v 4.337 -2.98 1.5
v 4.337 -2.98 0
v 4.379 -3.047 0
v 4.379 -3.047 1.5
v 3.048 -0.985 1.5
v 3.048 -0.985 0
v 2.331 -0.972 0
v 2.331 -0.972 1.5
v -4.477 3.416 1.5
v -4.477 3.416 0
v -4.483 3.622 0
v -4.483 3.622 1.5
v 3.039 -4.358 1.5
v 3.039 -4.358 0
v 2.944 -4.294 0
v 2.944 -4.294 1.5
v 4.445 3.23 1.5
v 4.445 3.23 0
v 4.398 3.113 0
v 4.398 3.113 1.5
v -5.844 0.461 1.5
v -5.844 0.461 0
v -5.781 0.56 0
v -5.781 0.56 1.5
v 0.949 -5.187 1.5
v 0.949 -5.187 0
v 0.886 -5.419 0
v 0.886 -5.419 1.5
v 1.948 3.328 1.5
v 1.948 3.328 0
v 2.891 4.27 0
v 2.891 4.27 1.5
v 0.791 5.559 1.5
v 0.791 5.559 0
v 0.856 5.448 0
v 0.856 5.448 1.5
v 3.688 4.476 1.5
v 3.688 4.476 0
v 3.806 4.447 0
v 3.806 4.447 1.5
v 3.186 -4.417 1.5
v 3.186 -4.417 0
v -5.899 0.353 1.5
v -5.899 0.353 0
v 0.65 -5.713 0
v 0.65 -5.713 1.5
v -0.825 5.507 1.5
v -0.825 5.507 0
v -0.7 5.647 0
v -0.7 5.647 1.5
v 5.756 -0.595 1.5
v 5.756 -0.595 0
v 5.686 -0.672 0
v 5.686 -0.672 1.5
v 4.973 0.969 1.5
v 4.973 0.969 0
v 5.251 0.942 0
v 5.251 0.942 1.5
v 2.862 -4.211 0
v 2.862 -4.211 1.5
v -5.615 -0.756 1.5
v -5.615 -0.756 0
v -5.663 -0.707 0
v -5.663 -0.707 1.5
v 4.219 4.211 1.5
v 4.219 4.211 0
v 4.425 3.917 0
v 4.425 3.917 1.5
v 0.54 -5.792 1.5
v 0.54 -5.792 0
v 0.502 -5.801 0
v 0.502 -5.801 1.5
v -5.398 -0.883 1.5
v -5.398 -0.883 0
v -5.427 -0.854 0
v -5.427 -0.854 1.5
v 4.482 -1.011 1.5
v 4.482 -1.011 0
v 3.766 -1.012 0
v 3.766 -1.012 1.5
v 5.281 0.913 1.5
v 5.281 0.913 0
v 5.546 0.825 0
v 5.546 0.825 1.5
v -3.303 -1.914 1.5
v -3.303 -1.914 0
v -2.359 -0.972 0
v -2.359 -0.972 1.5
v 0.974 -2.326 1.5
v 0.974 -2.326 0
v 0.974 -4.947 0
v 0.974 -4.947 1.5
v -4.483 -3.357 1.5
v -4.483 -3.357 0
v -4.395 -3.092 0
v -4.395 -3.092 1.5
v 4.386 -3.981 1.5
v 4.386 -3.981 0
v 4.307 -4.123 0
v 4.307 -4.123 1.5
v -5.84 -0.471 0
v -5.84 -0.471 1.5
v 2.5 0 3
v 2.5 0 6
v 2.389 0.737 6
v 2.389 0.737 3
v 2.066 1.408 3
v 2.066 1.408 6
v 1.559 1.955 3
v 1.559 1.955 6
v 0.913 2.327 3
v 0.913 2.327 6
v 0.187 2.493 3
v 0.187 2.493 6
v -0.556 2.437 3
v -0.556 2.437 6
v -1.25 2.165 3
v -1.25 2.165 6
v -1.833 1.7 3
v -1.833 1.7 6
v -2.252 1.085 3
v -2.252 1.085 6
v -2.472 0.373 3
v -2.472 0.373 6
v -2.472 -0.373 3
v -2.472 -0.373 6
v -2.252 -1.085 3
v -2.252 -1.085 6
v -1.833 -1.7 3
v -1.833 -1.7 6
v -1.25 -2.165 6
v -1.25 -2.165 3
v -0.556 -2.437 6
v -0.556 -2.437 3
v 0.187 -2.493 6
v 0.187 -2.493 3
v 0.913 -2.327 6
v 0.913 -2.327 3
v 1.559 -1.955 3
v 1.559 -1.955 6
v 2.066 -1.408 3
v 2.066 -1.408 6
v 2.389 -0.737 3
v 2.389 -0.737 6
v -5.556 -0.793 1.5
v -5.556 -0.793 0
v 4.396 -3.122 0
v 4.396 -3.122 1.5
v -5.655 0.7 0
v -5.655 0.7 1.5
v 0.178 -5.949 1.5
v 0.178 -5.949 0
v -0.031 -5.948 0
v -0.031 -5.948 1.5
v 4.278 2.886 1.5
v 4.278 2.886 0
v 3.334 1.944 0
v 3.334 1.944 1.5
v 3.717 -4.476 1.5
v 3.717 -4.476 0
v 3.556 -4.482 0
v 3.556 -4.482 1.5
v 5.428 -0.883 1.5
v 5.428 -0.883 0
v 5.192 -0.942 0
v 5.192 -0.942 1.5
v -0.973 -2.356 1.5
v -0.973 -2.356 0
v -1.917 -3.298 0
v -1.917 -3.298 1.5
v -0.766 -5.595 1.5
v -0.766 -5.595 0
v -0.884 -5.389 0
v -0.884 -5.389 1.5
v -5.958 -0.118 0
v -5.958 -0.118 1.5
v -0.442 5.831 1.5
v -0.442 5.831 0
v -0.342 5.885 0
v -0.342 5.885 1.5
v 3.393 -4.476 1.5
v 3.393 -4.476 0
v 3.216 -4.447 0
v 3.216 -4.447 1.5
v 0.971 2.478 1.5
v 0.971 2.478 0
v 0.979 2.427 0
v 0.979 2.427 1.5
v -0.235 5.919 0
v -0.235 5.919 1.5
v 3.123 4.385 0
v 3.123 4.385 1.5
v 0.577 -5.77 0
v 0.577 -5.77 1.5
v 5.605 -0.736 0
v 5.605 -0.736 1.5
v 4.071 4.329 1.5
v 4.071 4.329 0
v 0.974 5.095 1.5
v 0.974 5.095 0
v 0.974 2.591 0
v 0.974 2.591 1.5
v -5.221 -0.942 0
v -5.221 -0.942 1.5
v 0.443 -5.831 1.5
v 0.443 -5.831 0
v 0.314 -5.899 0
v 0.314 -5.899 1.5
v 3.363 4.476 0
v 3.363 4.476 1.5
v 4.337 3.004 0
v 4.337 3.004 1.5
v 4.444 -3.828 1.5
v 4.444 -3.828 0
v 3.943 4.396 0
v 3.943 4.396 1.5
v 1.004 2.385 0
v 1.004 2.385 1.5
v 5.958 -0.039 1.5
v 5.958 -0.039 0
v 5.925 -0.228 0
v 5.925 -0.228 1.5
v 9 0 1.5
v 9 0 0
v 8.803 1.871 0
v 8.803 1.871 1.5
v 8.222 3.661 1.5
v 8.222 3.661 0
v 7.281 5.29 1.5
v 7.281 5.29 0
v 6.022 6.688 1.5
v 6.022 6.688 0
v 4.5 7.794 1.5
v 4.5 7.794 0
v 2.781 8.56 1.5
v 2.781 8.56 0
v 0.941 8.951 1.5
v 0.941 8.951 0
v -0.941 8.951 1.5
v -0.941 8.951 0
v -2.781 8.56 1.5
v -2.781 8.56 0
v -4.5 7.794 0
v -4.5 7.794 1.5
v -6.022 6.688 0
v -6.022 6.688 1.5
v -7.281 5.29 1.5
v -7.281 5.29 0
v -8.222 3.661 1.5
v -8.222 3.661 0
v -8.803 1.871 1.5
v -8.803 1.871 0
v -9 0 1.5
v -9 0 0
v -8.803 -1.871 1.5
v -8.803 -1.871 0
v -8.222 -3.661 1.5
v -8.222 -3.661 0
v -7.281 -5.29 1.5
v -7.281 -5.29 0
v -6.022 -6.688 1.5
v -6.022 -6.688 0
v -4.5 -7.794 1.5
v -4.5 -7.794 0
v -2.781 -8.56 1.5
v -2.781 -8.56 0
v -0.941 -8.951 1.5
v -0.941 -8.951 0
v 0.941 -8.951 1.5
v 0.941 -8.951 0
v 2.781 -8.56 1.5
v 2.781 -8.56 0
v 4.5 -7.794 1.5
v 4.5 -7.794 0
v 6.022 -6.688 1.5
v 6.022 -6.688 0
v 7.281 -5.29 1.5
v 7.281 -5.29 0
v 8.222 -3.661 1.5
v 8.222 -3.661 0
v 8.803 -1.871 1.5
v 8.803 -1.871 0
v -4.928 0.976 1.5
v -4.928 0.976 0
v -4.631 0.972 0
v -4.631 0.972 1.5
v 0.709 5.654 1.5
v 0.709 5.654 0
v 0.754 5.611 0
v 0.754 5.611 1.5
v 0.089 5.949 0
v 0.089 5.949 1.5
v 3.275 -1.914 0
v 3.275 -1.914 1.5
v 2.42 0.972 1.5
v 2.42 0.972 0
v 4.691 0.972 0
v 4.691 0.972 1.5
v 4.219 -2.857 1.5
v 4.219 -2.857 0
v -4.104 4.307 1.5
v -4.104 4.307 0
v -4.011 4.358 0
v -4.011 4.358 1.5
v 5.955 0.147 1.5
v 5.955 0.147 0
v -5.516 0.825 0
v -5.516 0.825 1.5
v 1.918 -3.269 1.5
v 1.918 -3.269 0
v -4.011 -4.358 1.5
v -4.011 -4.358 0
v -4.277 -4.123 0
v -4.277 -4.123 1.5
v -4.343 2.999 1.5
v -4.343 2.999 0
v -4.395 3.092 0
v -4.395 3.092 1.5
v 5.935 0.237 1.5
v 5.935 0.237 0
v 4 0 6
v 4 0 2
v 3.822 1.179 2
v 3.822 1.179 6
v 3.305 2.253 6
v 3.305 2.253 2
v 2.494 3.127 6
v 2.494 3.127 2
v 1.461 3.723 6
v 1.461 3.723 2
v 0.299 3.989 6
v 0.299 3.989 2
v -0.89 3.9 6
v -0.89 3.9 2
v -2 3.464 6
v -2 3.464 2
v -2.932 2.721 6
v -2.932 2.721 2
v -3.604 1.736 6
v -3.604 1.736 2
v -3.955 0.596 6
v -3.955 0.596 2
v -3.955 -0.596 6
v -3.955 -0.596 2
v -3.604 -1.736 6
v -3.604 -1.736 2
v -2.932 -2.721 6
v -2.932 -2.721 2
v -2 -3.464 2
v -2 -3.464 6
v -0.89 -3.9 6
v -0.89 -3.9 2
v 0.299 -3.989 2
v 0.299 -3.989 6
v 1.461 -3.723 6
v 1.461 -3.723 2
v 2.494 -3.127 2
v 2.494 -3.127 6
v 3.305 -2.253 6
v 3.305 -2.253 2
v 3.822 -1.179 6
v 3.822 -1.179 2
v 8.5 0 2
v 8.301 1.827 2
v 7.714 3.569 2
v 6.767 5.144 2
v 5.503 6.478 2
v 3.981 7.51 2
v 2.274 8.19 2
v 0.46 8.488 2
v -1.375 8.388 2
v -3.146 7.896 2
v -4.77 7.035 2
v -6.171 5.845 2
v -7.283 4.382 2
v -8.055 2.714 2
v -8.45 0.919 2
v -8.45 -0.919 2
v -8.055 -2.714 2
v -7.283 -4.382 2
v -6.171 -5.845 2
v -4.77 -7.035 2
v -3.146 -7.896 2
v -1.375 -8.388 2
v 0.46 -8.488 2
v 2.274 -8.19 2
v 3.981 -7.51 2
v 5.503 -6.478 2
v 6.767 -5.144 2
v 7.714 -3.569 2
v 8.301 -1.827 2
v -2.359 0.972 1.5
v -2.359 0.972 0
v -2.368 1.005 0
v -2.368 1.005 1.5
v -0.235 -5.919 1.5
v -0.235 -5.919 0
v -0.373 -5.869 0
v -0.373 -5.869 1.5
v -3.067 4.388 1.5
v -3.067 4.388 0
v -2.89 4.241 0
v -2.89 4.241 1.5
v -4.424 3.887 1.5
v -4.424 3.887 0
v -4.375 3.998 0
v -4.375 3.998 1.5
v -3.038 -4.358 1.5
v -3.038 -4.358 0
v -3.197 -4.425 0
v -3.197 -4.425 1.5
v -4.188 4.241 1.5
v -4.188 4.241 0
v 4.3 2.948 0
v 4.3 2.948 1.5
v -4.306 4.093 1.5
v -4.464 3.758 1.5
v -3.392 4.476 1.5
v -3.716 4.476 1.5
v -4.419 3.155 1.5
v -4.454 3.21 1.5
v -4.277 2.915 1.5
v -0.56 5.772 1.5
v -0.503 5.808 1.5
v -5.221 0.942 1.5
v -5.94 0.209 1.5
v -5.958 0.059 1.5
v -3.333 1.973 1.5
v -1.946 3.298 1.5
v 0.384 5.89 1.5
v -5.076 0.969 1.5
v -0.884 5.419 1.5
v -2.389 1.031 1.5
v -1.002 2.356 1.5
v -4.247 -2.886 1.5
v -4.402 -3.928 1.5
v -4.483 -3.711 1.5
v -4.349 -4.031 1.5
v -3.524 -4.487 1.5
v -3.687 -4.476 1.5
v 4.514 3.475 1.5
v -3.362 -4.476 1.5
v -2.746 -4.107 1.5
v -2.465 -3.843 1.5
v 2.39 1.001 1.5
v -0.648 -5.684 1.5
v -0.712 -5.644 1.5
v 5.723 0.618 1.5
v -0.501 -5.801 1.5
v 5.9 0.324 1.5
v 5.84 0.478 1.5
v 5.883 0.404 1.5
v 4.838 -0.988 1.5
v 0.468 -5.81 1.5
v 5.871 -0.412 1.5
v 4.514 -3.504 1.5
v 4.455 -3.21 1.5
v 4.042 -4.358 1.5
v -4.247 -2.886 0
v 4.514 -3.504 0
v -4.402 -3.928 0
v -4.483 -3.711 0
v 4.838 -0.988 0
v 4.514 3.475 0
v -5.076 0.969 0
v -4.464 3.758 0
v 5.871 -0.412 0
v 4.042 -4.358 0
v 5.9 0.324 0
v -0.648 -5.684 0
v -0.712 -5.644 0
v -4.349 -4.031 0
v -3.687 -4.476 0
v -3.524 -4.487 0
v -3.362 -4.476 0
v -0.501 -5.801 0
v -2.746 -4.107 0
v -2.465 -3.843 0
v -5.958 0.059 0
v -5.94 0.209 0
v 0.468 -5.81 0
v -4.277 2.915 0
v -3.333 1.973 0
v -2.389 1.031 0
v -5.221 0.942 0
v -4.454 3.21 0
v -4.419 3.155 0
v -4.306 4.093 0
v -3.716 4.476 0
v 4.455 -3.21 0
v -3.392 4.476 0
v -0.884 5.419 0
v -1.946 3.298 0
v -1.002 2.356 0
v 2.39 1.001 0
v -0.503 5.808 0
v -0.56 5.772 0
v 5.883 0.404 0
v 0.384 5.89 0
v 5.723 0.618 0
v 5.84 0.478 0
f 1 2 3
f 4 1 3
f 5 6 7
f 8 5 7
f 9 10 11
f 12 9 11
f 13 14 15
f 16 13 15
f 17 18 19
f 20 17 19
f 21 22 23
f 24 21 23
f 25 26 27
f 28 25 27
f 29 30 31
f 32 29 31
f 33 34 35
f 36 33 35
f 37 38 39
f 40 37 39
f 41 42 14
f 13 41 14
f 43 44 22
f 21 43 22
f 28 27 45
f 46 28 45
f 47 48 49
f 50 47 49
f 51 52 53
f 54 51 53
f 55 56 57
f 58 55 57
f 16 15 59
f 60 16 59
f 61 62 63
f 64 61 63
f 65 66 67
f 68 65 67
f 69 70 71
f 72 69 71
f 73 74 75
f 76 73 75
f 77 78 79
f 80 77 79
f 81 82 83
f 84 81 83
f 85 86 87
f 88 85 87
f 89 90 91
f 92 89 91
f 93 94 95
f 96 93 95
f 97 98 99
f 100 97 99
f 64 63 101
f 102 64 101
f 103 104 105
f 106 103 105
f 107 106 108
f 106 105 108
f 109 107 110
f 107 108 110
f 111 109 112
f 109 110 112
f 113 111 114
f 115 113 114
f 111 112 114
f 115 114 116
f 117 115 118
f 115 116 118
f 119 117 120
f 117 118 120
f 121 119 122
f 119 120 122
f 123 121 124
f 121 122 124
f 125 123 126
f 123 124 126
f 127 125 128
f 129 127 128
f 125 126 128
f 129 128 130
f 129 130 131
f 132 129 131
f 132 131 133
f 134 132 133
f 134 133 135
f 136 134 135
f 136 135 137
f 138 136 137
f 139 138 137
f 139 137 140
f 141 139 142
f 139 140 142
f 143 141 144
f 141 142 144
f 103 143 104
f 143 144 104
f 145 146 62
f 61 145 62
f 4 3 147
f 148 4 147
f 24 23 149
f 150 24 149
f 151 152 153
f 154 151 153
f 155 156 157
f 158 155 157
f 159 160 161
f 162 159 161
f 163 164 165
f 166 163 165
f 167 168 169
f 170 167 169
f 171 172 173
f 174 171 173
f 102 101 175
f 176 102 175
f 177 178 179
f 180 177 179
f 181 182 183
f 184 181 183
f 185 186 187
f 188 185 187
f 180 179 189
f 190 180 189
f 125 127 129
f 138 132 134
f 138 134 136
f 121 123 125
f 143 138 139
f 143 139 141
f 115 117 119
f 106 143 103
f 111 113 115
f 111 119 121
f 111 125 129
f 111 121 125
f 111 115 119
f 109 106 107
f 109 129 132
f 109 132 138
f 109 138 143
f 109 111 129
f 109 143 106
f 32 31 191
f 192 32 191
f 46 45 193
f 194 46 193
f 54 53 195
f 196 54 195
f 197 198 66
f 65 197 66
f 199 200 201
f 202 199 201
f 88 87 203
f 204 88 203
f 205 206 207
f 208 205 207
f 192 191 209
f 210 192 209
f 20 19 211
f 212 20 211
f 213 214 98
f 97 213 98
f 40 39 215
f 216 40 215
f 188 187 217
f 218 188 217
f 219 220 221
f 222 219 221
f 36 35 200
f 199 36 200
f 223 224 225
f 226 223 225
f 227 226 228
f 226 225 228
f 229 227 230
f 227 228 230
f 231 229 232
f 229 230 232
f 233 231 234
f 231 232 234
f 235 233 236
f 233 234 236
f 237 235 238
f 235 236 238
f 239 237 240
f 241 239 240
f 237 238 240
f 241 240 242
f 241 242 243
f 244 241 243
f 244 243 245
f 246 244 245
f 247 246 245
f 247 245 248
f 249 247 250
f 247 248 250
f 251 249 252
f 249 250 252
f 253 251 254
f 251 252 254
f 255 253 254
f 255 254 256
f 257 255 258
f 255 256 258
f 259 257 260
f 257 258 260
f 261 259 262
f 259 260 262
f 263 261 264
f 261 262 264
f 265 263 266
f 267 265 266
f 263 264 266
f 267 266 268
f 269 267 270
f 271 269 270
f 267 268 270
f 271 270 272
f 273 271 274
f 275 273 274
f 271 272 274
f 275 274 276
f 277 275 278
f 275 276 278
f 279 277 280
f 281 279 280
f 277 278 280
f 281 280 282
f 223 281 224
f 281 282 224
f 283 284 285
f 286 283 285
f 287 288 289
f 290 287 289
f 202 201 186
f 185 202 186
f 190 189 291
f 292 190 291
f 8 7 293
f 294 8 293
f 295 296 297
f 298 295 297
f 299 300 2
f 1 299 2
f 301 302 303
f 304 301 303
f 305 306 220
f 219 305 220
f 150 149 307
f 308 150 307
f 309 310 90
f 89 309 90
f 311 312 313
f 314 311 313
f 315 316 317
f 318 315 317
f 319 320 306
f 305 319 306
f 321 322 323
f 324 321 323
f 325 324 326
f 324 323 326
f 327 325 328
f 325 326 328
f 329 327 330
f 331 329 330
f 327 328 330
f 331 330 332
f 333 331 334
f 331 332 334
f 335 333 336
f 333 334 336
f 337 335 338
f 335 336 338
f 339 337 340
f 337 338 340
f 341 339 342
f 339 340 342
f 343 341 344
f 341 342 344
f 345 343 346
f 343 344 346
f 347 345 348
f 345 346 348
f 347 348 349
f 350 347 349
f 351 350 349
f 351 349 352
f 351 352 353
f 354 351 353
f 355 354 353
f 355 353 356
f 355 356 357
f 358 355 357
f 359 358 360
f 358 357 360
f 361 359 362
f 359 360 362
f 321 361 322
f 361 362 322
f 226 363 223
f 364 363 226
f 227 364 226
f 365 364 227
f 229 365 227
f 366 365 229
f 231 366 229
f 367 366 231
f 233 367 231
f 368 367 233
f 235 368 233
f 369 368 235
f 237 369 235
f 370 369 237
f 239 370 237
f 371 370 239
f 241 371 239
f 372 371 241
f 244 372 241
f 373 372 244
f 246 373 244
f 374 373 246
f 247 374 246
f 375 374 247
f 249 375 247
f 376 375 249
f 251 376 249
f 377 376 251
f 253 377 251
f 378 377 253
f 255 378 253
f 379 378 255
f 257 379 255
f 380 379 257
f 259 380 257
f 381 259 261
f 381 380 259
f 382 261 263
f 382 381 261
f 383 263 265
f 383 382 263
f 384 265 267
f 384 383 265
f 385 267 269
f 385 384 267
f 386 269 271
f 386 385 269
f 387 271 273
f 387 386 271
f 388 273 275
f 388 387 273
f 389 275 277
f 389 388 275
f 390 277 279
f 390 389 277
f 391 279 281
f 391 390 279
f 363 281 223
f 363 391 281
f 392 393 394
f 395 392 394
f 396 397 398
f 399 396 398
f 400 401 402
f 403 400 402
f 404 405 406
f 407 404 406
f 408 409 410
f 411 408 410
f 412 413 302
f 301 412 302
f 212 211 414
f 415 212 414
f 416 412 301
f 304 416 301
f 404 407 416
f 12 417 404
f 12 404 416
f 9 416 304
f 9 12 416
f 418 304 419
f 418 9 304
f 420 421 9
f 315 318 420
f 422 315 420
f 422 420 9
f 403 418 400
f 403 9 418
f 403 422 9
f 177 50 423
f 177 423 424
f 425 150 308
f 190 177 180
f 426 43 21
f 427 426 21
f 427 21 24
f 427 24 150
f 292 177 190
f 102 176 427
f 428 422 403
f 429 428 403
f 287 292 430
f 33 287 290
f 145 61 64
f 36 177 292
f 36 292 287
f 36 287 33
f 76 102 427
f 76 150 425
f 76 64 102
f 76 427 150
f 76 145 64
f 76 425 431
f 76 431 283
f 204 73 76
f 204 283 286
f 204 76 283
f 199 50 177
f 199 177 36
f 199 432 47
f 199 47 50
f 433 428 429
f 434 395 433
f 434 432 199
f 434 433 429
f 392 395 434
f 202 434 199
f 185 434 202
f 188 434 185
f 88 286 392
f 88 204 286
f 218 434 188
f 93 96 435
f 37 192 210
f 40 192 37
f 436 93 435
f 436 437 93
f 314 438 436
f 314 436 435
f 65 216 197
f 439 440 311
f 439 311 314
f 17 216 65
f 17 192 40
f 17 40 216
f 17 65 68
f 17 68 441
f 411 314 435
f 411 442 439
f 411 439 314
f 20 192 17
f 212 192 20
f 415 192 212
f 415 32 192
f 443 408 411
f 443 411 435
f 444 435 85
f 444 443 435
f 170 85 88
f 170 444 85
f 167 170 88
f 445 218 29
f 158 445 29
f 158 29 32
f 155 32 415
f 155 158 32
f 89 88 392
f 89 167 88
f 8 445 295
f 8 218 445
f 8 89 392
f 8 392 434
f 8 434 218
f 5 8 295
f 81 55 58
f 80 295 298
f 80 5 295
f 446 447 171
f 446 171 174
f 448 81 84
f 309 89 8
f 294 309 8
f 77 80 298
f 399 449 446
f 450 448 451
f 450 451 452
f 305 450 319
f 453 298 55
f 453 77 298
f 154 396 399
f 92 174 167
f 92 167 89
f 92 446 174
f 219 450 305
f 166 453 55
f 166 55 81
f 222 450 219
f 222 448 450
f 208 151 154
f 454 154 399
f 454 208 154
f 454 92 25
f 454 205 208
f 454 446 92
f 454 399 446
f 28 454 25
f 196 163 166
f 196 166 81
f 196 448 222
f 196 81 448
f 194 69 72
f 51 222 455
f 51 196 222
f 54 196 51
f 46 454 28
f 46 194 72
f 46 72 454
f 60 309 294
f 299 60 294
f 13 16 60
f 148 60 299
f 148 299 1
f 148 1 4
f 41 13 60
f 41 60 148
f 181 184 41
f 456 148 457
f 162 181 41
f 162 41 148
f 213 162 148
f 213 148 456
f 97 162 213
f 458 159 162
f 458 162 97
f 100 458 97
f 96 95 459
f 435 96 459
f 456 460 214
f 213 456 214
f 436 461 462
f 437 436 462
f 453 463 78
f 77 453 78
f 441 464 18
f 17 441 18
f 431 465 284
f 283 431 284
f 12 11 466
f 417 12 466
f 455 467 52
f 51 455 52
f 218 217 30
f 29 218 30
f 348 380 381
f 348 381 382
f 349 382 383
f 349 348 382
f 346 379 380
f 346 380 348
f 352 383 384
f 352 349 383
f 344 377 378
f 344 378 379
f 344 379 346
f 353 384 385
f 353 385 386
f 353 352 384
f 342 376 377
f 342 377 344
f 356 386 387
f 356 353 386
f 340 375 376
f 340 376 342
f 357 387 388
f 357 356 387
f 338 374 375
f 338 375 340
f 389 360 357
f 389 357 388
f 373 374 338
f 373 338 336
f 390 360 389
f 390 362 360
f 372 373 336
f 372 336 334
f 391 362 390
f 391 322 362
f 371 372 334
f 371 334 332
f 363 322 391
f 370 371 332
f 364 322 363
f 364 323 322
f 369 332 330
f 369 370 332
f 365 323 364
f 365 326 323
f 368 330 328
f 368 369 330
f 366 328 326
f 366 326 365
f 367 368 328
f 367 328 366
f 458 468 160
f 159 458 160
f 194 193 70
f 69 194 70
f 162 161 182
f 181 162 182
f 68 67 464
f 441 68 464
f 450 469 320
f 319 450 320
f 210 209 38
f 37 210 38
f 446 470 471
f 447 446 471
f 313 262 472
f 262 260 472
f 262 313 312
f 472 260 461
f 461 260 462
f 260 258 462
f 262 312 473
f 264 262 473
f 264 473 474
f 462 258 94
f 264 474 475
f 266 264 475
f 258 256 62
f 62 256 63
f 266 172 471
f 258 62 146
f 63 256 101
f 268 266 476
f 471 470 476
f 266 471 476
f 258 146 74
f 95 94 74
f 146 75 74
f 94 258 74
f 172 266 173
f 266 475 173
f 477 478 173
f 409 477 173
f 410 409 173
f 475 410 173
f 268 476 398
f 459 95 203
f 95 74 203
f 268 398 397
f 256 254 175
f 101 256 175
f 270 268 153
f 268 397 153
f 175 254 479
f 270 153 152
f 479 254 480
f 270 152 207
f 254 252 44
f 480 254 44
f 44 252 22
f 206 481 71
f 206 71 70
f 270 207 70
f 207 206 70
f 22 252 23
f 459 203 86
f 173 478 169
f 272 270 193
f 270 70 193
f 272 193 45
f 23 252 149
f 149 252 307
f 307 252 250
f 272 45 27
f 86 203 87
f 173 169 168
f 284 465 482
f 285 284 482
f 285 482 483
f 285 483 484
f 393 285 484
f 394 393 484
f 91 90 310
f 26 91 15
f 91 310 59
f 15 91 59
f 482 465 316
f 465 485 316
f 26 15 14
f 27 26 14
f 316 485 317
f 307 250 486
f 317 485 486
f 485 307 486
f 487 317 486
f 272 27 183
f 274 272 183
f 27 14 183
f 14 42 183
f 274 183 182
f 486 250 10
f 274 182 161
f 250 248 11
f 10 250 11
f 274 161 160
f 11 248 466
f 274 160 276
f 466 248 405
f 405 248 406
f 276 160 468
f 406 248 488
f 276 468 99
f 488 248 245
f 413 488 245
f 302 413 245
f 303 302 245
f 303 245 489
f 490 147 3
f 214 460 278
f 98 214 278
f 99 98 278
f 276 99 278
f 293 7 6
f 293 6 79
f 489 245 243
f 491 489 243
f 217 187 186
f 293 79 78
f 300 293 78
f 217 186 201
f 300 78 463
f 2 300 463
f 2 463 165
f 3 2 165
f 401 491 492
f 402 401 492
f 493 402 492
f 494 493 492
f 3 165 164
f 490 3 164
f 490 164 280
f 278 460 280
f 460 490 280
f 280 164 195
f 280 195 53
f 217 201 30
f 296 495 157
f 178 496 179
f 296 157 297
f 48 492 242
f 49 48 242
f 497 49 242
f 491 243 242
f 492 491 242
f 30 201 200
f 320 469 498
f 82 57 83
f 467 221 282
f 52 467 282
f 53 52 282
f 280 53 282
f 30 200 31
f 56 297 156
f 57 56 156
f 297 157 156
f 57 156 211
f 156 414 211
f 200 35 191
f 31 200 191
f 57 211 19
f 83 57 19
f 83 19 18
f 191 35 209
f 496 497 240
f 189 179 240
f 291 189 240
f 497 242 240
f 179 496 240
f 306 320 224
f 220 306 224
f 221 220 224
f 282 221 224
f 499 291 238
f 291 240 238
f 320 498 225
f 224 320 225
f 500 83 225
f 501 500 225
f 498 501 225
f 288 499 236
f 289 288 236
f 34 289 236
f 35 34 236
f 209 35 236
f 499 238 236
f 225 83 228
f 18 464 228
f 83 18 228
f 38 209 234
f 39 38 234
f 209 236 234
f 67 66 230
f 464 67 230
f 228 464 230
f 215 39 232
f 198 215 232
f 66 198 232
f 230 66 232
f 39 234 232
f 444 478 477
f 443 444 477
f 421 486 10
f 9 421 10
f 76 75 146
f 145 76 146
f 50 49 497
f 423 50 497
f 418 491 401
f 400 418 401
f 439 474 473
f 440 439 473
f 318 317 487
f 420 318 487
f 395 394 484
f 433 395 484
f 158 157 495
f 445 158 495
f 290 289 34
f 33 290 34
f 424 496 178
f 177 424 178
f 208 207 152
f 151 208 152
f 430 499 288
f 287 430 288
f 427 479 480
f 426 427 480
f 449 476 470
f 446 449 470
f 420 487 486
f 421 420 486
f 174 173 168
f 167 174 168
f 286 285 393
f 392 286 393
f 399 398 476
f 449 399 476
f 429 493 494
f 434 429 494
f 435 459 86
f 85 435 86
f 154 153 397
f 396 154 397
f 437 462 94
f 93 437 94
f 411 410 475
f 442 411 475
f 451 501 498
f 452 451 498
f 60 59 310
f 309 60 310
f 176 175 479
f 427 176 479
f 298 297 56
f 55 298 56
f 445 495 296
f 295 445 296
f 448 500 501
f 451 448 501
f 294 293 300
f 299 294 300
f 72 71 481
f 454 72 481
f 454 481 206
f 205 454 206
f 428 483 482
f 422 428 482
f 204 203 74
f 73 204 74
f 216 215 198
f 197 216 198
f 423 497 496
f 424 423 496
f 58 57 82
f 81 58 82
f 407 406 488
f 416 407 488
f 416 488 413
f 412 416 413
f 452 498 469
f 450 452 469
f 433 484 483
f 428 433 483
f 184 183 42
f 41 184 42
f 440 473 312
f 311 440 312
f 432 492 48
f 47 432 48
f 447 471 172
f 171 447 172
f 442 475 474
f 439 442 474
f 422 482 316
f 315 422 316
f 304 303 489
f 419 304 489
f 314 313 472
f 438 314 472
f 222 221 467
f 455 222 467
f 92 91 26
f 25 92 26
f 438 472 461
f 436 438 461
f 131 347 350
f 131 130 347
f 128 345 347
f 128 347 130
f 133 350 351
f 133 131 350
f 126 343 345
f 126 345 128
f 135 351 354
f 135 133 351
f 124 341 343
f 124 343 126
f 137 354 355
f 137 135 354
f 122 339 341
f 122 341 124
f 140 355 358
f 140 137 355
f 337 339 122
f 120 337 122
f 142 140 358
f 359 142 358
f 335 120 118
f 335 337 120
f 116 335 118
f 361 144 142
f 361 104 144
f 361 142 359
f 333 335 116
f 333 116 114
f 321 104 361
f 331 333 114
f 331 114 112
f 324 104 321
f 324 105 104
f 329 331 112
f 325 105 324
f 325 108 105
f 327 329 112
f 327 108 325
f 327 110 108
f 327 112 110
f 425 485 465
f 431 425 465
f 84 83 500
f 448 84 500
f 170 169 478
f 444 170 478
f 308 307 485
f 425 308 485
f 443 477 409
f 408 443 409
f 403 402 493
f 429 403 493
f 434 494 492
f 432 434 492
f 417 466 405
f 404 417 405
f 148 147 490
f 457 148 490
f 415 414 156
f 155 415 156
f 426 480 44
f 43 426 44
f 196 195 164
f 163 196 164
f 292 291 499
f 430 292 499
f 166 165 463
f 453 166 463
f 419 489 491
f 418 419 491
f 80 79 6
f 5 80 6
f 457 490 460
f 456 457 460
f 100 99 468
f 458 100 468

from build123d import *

# Parameters (mm, degrees)
F0_R     = 9
F1_DEPTH = 2
F2_R     = 4
F3_DEPTH = 4
F4_R     = 2.5
F5_DEPTH = 3
F6_SIZE  = 0.5
F8_DEPTH = 1.5


with BuildPart() as f1:
    # F0 (on Top) → F1 (new body)
    with BuildSketch(Plane.XY):
        Circle(F0_R)
    extrude(amount=F1_DEPTH)

    # F2 (on face) → F3 (join)
    with BuildSketch(Plane.XY.offset(2)):
        Circle(F2_R)
    extrude(amount=F3_DEPTH)

    # F4 (on face) → F5 (cut)
    with BuildSketch(Plane.XY.offset(6)):
        Circle(F4_R)
    extrude(amount=-F5_DEPTH, mode=Mode.SUBTRACT)

    # F6
    f6_edges = [f1.edges().sort_by_distance(p)[0] for p in [
        (-9, 0, 2),
    ]]
    chamfer(f6_edges, length=F6_SIZE)

    # F7 (on face) → F8 (cut)
    with BuildSketch(Plane(origin=(0, 0, 0), x_dir=(1, 0, 0), z_dir=(0, 0, -1))):
        Polygon((-0.031379, 5.948377), (-0.235333, 5.919157), (-0.372759, 5.868757), (-0.500818, 5.801363), (-0.64831, 5.683569), (-0.711513, 5.643549), (-0.766303, 5.595223), (-0.884297, 5.389084), (-0.972792, 2.355883), (-1.91674, 3.298237), (-2.464657, 3.842872), (-2.74588, 4.106761), (-3.037677, 4.358384), (-3.197437, 4.424921), (-3.362159, 4.476179), (-3.5244, 4.487041), (-3.686641, 4.476179), (-4.011123, 4.358384), (-4.276609, 4.122796), (-4.349034, 4.030994), (-4.401972, 3.928468), (-4.483097, 3.710516), (-4.483097, 3.357134), (-4.394602, 3.092097), (-4.24711, 2.885957), (-3.303163, 1.914155), (-2.359215, 0.971802), (-5.220556, 0.942353), (-5.397547, 0.883456), (-5.427045, 0.854008), (-5.556038, 0.793243), (-5.614945, 0.756011), (-5.663032, 0.706765), (-5.840022, 0.471176), (-5.958016, 0.117794), (-5.958016, -0.058897), (-5.940408, -0.209293), (-5.899019, -0.353383), (-5.843566, -0.461413), (-5.781025, -0.559523), (-5.655249, -0.699811), (-5.51554, -0.82456), (-5.220556, -0.942354), (-5.075648, -0.968558), (-4.928112, -0.97628), (-4.630589, -0.971802), (-4.188114, -0.971802), (-2.359215, -0.971802), (-2.368134, -1.005446), (-2.388713, -1.030699), (-3.332661, -1.973053), (-4.276609, -2.915406), (-4.34313, -2.999393), (-4.394602, -3.092097), (-4.419005, -3.155066), (-4.453599, -3.209892), (-4.476923, -3.415726), (-4.483097, -3.622171), (-4.464349, -3.757662), (-4.424101, -3.887208), (-4.374765, -3.997645), (-4.306107, -4.093348), (-4.188114, -4.240591), (-4.103985, -4.307), (-4.011123, -4.358385), (-3.71614, -4.476179), (-3.391658, -4.476179), (-3.067176, -4.387833), (-2.890186, -4.240591), (-1.946238, -3.298237), (-1.00229, -2.355884), (-0.884297, -5.418533), (-0.8253, -5.506878), (-0.699524, -5.647167), (-0.559815, -5.771915), (-0.503448, -5.807594), (-0.441821, -5.830812), (-0.341941, -5.885287), (-0.235333, -5.919158), (0.089149, -5.948606), (0.384133, -5.889709), (0.708615, -5.654121), (0.754319, -5.61094), (0.790702, -5.558969), (0.856107, -5.447981), (0.9741, -5.094599), (0.9741, -4.417282), (0.9741, -2.591472), (0.971489, -2.477691), (0.979459, -2.426523), (1.003599, -2.385332), (1.947546, -3.327686), (2.891494, -4.270039), (3.122896, -4.385014), (3.363468, -4.476179), (3.68795, -4.476179), (3.805943, -4.446731), (3.94337, -4.39633), (4.071429, -4.328936), (4.218921, -4.211142), (4.425409, -3.916657), (4.513904, -3.474929), (4.444862, -3.229831), (4.398065, -3.113042), (4.336914, -3.003752), (4.300041, -2.947904), (4.277917, -2.885958), (3.33397, -1.943604), (2.390022, -1.001251), (2.41952, -0.971802), (2.861996, -0.971802), (4.690894, -0.971802), (4.972609, -0.968567), (5.251363, -0.942354), (5.280862, -0.912905), (5.546347, -0.82456), (5.723337, -0.61842), (5.839817, -0.478169), (5.883167, -0.404005), (5.900327, -0.323934), (5.934856, -0.237188), (5.954737, -0.147151), (5.958016, 0.039233), (5.925076, 0.228087), (5.870829, 0.412279), (5.7562, 0.594983), (5.685681, 0.672036), (5.605344, 0.736213), (5.428354, 0.883456), (5.192367, 0.942353), (4.838344, 0.987761), (4.482387, 1.011028), (3.766457, 1.011578), (3.048146, 0.984877), (2.331025, 0.971802), (3.274973, 1.914155), (4.218921, 2.856509), (4.337268, 2.979647), (4.379451, 3.047229), (4.395911, 3.121546), (4.454907, 3.209891), (4.513904, 3.504377), (4.444233, 3.827854), (4.386266, 3.98061), (4.307416, 4.122796), (4.04193, 4.358384), (3.717448, 4.476179), (3.555567, 4.481563), (3.392966, 4.476179), (3.215976, 4.44673), (3.186478, 4.417282), (3.038986, 4.358384), (2.944209, 4.294123), (2.861996, 4.211142), (1.918048, 3.268788), (0.9741, 2.326435), (0.9741, 3.092097), (0.9741, 4.947355), (0.94889, 5.186814), (0.885605, 5.418532), (0.649618, 5.713018), (0.576669, 5.769819), (0.540299, 5.792295), (0.502126, 5.801363), (0.468426, 5.810267), (0.44313, 5.830812), (0.313926, 5.898818), (0.177644, 5.948606), align=None)
    extrude(amount=-F8_DEPTH, mode=Mode.SUBTRACT)


solid = f1.part
